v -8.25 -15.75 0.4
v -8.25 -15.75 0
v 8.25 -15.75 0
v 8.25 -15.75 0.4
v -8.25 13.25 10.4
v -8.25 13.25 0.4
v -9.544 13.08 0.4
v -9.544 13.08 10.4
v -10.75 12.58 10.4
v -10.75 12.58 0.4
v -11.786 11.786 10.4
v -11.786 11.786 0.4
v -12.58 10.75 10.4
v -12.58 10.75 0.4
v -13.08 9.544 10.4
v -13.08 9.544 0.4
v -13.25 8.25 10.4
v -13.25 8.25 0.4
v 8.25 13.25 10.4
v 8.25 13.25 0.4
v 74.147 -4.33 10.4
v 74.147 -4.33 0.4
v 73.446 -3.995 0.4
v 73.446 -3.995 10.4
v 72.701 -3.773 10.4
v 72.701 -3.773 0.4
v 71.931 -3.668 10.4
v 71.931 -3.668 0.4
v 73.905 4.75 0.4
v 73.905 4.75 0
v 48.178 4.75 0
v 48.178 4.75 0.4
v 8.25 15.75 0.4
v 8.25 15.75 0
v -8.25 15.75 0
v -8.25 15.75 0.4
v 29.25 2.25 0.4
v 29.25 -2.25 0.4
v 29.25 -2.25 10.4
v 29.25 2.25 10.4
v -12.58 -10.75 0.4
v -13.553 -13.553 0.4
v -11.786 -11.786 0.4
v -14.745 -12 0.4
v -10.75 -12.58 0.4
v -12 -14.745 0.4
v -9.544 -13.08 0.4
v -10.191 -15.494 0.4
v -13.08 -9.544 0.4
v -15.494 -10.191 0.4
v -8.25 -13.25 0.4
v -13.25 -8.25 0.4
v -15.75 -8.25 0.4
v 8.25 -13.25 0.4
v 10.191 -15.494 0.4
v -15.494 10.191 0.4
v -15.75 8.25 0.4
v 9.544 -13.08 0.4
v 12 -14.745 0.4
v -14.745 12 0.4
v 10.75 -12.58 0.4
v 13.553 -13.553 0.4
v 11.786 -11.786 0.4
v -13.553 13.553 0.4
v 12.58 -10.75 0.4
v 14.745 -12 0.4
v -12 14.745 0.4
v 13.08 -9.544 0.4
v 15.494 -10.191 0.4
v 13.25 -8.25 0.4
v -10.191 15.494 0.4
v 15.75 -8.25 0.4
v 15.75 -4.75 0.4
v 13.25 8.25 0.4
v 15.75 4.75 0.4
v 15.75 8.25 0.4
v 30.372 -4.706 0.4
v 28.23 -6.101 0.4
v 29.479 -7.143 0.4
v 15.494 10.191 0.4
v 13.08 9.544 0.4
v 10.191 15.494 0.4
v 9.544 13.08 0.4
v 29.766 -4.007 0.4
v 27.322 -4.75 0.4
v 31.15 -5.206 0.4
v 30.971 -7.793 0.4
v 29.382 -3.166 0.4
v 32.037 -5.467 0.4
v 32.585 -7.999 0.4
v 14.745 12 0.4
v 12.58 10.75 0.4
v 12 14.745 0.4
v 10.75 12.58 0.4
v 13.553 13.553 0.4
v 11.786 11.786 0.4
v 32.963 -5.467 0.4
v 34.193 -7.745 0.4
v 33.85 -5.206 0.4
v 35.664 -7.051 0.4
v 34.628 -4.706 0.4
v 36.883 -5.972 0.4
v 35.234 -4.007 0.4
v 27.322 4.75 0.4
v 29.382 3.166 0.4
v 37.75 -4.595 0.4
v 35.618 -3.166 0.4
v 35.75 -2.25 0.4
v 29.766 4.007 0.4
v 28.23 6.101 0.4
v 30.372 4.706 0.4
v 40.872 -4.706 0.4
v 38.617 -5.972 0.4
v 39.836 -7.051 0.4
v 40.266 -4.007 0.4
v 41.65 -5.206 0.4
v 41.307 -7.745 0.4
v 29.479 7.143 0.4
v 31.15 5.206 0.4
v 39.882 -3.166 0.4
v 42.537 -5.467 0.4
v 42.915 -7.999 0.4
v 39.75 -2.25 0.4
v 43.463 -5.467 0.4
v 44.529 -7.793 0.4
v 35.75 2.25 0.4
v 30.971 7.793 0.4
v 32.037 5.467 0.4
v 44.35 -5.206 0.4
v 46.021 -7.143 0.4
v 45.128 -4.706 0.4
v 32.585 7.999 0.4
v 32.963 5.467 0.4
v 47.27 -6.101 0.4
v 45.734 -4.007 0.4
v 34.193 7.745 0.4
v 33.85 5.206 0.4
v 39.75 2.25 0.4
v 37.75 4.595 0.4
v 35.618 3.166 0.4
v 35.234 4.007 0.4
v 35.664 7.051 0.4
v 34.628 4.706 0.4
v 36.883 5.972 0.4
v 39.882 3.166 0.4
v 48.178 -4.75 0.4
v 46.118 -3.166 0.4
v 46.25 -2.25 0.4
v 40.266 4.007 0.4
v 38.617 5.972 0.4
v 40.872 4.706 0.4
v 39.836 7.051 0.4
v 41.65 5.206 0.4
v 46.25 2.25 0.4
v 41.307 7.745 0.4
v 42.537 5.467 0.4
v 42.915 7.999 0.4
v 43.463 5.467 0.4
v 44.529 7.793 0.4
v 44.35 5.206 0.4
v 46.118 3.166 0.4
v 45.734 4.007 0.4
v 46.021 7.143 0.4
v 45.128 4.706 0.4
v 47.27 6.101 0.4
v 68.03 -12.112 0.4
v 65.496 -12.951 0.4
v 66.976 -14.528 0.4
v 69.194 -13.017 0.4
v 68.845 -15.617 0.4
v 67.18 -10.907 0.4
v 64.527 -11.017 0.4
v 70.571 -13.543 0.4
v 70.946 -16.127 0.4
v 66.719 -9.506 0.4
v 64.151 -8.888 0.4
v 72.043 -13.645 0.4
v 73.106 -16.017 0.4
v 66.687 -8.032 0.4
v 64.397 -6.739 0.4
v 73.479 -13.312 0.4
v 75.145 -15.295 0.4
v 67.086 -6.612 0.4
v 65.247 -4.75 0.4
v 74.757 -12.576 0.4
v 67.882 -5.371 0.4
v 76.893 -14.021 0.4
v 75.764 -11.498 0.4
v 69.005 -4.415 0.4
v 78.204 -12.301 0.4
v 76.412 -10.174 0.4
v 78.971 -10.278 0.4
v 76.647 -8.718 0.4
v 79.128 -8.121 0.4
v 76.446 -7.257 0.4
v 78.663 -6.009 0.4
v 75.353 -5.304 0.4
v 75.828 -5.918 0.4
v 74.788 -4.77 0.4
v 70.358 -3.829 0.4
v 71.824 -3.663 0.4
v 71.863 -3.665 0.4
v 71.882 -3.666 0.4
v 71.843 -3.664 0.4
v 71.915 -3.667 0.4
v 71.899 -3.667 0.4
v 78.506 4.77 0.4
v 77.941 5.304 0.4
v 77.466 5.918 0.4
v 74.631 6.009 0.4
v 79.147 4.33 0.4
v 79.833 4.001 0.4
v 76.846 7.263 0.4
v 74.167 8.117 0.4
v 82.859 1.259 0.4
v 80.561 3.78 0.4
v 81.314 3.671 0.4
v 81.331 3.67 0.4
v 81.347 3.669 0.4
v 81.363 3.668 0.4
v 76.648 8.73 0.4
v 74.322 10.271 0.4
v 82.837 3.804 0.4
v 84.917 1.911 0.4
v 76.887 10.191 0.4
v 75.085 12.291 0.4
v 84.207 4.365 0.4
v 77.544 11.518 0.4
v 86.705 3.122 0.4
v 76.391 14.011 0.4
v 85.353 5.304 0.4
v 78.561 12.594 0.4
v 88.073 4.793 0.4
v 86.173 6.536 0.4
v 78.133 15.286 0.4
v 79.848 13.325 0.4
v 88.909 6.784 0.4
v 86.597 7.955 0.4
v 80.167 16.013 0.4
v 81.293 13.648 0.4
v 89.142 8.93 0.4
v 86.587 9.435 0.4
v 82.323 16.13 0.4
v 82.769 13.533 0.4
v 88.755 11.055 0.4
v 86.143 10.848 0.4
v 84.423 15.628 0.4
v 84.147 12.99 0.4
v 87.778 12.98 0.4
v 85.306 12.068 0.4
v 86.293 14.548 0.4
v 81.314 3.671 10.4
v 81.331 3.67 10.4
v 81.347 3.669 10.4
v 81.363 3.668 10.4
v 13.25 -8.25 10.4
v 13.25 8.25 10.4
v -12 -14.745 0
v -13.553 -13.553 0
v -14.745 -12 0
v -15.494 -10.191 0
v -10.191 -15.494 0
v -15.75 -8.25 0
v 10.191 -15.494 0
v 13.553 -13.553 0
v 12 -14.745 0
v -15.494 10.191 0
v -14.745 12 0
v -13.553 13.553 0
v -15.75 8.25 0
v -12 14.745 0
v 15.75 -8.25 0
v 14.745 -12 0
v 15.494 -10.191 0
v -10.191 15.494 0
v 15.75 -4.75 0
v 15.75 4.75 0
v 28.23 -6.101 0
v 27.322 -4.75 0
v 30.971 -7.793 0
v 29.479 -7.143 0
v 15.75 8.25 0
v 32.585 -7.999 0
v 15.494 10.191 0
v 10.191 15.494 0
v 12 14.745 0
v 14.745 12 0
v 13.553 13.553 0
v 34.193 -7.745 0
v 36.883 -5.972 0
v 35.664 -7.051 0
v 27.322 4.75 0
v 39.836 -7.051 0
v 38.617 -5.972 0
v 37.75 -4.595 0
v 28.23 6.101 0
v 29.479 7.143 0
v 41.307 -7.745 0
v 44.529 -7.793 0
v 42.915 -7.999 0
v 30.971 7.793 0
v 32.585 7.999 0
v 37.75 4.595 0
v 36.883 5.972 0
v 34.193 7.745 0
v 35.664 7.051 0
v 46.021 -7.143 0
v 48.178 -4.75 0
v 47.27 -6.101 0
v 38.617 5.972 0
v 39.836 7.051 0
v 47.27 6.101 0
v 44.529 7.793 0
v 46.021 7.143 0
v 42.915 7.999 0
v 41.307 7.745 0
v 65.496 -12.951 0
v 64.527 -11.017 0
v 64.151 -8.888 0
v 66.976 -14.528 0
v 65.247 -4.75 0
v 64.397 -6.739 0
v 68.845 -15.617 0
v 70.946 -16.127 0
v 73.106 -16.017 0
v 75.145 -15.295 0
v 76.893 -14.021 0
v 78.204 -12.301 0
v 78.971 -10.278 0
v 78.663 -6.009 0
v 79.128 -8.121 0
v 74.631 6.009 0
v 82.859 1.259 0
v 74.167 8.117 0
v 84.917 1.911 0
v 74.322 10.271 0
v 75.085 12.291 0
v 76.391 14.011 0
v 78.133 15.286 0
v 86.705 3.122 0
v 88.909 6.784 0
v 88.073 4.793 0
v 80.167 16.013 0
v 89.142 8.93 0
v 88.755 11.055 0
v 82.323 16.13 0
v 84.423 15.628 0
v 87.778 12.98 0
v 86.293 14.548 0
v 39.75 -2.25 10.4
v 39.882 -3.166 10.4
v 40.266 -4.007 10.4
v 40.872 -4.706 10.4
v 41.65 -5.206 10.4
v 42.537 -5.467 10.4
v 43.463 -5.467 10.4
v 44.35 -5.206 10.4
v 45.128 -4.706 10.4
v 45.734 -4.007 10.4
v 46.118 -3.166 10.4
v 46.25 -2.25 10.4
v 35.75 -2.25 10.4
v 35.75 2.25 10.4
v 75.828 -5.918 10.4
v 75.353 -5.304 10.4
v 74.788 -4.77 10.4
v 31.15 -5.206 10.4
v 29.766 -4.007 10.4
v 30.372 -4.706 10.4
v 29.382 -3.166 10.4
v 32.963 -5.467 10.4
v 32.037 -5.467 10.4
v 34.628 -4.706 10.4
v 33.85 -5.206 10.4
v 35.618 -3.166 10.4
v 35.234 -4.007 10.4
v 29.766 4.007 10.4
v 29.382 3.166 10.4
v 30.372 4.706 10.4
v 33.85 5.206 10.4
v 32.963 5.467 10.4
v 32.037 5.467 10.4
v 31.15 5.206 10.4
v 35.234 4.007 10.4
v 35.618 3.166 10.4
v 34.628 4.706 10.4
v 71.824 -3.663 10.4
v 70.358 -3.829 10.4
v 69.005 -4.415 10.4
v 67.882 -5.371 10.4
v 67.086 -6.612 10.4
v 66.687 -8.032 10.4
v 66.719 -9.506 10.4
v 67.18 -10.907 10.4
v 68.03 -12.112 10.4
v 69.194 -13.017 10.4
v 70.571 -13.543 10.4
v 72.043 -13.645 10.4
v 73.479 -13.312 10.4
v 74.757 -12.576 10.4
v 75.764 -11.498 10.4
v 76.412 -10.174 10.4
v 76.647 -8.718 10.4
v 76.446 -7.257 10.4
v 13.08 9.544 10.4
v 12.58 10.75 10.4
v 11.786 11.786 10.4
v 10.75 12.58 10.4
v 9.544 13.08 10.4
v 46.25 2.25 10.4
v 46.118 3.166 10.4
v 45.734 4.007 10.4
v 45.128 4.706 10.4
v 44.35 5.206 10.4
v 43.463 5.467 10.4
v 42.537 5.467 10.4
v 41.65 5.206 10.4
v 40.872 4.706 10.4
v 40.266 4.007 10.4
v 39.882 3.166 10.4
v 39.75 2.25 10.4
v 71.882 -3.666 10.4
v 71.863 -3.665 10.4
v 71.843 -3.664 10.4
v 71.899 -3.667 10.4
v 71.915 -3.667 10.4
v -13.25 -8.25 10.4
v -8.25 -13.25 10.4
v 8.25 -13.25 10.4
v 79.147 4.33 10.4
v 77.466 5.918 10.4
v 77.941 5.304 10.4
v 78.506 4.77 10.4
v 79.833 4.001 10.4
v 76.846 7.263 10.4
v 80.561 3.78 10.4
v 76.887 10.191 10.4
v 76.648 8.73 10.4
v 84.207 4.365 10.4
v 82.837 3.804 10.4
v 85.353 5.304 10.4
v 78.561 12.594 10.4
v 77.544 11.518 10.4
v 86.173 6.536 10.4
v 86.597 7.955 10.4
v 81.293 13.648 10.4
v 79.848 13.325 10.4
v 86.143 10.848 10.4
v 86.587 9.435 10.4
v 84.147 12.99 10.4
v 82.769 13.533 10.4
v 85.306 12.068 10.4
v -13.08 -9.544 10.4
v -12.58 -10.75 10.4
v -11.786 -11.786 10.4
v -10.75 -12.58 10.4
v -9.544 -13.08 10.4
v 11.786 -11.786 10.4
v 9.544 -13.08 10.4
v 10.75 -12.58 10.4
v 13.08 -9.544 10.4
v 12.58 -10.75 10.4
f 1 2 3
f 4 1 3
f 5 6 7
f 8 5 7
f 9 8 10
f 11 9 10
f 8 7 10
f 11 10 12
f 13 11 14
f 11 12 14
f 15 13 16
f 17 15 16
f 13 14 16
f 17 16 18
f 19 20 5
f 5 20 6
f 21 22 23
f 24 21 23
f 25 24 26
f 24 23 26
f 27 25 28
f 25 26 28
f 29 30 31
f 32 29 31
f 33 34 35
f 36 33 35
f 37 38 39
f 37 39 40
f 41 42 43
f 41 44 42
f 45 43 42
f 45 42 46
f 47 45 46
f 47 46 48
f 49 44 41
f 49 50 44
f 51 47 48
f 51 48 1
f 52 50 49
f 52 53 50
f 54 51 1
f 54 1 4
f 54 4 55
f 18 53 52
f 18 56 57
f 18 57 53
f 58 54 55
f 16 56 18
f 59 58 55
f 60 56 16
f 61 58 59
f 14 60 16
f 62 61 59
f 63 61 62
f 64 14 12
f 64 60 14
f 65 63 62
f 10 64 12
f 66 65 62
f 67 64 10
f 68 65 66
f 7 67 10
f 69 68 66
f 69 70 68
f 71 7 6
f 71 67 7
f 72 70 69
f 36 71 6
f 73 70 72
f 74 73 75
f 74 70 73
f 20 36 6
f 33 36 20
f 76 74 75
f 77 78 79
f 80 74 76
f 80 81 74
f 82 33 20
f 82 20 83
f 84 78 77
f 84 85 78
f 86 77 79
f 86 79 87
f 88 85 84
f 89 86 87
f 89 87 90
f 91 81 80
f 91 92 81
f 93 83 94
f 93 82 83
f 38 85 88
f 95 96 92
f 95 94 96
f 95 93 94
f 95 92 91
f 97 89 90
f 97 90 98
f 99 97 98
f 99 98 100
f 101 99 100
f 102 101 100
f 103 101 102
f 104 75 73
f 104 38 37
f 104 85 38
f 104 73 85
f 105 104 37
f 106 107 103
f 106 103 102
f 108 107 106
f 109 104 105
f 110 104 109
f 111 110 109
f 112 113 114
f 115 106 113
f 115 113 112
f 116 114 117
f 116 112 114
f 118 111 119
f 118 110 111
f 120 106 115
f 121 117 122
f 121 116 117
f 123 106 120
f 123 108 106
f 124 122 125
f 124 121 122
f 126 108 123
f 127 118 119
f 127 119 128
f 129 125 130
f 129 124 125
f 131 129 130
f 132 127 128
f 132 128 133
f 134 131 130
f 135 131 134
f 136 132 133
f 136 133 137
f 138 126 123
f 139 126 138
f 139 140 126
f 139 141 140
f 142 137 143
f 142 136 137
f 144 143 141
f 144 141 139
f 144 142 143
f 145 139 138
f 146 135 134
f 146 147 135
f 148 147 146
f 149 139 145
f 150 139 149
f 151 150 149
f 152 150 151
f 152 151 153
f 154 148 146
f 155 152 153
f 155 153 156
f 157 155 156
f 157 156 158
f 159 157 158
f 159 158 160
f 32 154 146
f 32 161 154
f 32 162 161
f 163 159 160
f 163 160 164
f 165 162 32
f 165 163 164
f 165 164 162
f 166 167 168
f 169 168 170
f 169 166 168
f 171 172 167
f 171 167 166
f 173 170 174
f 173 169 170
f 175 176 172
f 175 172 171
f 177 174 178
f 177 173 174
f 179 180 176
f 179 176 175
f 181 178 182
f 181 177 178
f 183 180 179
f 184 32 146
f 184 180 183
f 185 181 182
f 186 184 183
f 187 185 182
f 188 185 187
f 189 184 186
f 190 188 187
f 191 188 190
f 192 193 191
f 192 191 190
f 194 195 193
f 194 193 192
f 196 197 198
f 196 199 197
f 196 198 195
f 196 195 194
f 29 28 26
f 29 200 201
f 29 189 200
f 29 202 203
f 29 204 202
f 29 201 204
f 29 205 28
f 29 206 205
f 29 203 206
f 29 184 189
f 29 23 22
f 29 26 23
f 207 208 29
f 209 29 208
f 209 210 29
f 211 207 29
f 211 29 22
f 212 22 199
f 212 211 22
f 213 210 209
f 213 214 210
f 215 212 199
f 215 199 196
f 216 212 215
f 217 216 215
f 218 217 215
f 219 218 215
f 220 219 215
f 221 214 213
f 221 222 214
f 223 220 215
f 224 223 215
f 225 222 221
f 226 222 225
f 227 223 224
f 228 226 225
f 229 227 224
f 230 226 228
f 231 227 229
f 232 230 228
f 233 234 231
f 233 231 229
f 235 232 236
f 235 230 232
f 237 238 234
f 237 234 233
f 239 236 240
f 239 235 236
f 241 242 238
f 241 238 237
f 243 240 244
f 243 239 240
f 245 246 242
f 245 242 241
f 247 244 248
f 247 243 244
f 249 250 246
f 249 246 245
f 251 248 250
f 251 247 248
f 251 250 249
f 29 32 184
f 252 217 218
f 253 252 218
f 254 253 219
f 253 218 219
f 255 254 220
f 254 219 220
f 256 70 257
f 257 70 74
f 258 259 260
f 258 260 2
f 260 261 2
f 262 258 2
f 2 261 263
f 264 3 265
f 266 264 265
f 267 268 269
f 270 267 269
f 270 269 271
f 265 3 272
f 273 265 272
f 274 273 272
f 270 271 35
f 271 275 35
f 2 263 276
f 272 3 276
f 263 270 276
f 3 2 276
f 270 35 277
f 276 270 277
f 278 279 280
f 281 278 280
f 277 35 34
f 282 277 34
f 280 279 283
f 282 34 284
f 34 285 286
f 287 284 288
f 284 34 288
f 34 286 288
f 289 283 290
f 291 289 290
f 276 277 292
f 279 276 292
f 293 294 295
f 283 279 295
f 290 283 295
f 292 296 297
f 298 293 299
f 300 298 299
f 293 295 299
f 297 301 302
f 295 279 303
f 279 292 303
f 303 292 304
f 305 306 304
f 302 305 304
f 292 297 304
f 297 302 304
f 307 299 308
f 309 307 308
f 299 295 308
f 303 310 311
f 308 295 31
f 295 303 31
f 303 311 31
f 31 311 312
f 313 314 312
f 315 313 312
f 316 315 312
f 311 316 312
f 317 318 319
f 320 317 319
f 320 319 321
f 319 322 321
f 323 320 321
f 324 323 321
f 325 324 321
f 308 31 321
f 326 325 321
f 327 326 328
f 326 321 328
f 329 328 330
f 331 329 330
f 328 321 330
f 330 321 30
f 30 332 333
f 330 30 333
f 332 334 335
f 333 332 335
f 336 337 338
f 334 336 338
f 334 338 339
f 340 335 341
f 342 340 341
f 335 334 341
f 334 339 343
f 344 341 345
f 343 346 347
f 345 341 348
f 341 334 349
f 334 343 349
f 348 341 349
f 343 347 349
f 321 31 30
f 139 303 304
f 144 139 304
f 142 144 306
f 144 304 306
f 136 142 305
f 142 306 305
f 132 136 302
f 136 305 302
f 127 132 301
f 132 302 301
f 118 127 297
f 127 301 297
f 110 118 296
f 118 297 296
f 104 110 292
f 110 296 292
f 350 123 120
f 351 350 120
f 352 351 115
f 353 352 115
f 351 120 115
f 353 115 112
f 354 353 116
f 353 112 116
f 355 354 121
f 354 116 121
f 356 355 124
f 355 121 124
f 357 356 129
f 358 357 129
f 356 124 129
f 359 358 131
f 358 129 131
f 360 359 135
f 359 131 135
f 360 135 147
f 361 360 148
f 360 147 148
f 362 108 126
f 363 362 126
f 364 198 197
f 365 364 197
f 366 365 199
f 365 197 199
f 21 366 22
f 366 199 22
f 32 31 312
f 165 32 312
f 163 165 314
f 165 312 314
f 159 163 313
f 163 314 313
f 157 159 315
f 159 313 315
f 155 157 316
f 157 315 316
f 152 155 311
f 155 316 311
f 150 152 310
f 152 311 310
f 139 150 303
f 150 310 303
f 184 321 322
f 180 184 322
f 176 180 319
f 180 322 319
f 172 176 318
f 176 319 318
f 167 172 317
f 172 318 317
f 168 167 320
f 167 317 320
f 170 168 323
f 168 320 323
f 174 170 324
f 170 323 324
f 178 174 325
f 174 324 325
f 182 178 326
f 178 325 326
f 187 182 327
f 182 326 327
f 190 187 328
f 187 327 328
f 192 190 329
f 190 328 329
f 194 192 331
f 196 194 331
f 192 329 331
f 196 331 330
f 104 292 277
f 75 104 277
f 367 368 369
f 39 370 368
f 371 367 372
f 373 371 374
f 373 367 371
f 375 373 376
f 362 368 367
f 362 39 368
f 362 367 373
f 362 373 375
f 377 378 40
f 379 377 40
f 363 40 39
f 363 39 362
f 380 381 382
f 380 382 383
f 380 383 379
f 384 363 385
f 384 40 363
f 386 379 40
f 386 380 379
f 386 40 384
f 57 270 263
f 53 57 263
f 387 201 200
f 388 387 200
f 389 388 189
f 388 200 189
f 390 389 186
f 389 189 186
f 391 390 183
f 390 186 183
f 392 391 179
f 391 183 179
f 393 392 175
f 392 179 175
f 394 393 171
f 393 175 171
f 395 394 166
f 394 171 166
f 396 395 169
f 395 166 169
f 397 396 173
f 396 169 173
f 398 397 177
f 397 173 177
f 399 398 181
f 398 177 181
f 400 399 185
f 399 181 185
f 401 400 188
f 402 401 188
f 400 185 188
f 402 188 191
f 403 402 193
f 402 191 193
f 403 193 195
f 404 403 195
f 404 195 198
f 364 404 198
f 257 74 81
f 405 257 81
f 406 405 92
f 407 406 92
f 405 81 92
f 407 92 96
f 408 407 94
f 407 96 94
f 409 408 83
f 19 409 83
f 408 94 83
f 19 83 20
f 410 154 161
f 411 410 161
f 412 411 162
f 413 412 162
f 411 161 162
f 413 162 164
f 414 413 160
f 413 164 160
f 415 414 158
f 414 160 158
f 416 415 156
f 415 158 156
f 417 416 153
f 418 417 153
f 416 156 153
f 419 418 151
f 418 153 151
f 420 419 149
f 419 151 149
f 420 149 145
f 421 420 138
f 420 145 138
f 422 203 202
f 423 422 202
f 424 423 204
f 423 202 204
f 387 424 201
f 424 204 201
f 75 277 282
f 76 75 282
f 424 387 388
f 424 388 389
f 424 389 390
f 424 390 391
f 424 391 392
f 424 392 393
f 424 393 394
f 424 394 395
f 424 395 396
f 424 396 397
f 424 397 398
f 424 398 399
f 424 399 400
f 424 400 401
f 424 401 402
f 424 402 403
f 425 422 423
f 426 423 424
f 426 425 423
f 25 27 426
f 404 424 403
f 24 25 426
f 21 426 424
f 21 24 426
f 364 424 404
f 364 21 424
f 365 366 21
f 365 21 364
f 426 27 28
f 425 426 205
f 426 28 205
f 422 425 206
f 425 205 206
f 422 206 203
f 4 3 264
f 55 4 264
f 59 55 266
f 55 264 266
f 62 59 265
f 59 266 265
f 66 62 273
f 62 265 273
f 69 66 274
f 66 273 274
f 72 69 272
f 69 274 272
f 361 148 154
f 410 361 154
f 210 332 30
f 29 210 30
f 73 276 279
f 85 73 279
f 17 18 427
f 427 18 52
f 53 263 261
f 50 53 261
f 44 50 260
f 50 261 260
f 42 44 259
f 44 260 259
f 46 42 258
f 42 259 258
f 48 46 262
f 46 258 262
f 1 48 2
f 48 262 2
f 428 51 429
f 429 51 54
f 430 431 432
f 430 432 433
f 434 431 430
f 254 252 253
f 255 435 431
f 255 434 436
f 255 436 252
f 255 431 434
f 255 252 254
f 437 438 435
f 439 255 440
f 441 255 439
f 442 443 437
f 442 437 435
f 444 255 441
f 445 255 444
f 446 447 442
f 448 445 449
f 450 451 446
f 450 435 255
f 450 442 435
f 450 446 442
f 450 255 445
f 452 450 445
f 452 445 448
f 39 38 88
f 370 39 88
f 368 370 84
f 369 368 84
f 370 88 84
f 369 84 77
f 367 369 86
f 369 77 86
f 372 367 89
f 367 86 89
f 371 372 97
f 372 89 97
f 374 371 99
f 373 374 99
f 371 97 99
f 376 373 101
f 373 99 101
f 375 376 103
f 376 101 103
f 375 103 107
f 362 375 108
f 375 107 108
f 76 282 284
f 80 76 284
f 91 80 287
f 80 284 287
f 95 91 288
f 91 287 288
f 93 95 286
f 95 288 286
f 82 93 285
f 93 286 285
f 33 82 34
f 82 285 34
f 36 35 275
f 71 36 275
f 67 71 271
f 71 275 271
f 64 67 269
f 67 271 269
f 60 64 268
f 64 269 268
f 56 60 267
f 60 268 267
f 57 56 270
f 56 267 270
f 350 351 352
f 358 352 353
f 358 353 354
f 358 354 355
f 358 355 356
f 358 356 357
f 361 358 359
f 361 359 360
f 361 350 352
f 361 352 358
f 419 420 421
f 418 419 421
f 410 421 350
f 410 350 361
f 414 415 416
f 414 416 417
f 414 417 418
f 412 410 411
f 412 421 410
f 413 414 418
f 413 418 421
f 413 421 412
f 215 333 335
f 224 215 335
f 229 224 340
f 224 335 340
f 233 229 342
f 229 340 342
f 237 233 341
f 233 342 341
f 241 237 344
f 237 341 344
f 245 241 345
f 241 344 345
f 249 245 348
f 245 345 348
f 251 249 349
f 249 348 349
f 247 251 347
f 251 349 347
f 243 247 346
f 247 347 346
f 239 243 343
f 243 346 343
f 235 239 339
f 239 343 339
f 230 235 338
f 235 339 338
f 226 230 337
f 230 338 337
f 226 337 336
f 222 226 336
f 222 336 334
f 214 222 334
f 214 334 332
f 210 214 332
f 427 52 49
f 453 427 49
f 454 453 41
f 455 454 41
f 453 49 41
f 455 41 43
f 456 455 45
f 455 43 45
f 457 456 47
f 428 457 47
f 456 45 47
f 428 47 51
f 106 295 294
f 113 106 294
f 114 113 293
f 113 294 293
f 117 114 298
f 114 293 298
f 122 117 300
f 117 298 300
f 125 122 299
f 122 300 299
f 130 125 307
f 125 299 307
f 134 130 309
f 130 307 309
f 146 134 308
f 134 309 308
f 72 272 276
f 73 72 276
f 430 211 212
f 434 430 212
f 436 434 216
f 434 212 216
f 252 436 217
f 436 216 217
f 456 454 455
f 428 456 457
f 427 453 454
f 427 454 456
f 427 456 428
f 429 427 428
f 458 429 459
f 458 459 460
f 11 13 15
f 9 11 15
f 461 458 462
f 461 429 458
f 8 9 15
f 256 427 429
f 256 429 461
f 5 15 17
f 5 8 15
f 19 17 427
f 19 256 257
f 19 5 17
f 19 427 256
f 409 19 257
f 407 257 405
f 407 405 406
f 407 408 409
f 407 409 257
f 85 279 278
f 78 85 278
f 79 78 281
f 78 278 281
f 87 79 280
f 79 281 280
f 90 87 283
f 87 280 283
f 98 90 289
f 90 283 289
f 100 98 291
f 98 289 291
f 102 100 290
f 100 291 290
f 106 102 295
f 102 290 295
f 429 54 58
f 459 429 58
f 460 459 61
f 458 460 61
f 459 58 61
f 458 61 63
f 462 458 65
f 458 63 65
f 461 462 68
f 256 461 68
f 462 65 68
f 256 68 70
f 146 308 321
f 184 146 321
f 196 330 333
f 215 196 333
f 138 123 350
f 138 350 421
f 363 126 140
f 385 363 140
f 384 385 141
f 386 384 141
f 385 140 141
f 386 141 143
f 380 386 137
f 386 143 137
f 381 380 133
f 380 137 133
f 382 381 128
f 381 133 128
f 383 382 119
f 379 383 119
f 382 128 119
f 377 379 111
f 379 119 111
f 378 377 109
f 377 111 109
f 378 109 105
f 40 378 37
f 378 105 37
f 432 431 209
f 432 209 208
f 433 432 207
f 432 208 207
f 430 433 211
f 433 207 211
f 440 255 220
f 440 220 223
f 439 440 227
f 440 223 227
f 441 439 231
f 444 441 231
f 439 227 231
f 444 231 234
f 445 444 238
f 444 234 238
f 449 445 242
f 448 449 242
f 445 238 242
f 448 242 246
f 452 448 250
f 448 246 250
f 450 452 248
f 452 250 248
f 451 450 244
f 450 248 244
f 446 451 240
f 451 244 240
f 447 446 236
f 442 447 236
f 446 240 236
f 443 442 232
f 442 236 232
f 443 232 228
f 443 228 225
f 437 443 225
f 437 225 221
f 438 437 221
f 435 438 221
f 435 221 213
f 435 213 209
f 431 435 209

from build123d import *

# Parameters (mm, degrees)
F0_W     = 6.5
F0_H     = 4.5
F0_W_2   = 4
F1_DEPTH = 0.4
F2_W     = 6.5
F2_H     = 4.5
F3_DEPTH = 10


with BuildPart() as f1:
    # F0 (on Top) → F1 (new body)
    with BuildSketch(Plane.XY):
        with BuildLine():
            ThreePointArc((37.75, -4.5952078799), (42.9146576596, -7.9993666334), (48.1780787943, -4.75))
            Line((48.1780787943, -4.75), (65.2471210858, -4.75))
            ThreePointArc((65.2471210858, -4.75), (70.9464832256, -16.1274567319), (78.6627816766, -6.0087617221))
            Line((78.6627816766, -6.0087617221), (82.8586882934, 1.2587617221))
            ThreePointArc((82.8586882934, 1.2587617221), (85.397114317, 15.1554445662), (74.6314469575, 6.0087617221))
            Line((74.6314469575, 6.0087617221), (73.9047005384, 4.75))
            Line((73.9047005384, 4.75), (48.1780787943, 4.75))
            ThreePointArc((48.1780787943, 4.75), (42.9146576596, 7.9993666334), (37.75, 4.5952078799))
            ThreePointArc((37.75, 4.5952078799), (32.5853423404, 7.9993666334), (27.3219212057, 4.75))
            Line((27.3219212057, 4.75), (15.75, 4.75))
            Line((15.75, 4.75), (15.75, 8.25))
            ThreePointArc((15.75, 8.25), (13.5533008589, 13.5533008589), (8.25, 15.75))
            Line((8.25, 15.75), (-8.25, 15.75))
            ThreePointArc((-8.25, 15.75), (-13.5533008589, 13.5533008589), (-15.75, 8.25))
            Line((-15.75, 8.25), (-15.75, -8.25))
            ThreePointArc((-15.75, -8.25), (-13.5533008589, -13.5533008589), (-8.25, -15.75))
            Line((-8.25, -15.75), (8.25, -15.75))
            ThreePointArc((8.25, -15.75), (13.5533008589, -13.5533008589), (15.75, -8.25))
            Line((15.75, -8.25), (15.75, -4.75))
            Line((15.75, -4.75), (27.3219212057, -4.75))
            ThreePointArc((27.3219212057, -4.75), (32.5853423404, -7.9993666334), (37.75, -4.5952078799))
        make_face()
        with BuildLine():
            ThreePointArc((-13.25, 8.25), (-11.7855339059, 11.7855339059), (-8.25, 13.25))
            Line((-8.25, 13.25), (-4.5, 13.25))
            Line((-4.5, 13.25), (4.5, 13.25))
            Line((4.5, 13.25), (8.25, 13.25))
            ThreePointArc((8.25, 13.25), (11.7855339059, 11.7855339059), (13.25, 8.25))
            Line((13.25, 8.25), (13.25, 4.5))
            Line((13.25, 4.5), (13.25, 2.25))
            Line((13.25, 2.25), (29.25, 2.25))
            ThreePointArc((29.25, 2.25), (32.5, 5.5), (35.75, 2.25))
            Line((35.75, 2.25), (39.75, 2.25))
            ThreePointArc((39.75, 2.25), (43, 5.5), (46.25, 2.25))
            Line((46.25, 2.25), (75.3480762114, 2.25))
            Line((75.3480762114, 2.25), (77.4659857711, 5.9183269633))
            ThreePointArc((77.4659857711, 5.9183269633), (84.147114317, 12.9903810568), (81.3631000881, 3.6683269633))
            Line((81.3631000881, 3.6683269633), (75.828242863, -5.9183269633))
            ThreePointArc((75.828242863, -5.9183269633), (69.1938526202, -13.0170311778), (71.8236394943, -3.6633711233))
            ThreePointArc((71.8236394943, -3.6633711233), (71.8529421017, -3.6644923419), (71.8822376294, -3.6657853946))
            ThreePointArc((71.8822376294, -3.6657853946), (71.9066861984, -3.6669963399), (71.931128546, -3.6683269633))
            Line((71.931128546, -3.6683269633), (72.75, -2.25))
            Line((72.75, -2.25), (46.25, -2.25))
            ThreePointArc((46.25, -2.25), (43, -5.5), (39.75, -2.25))
            Line((39.75, -2.25), (35.75, -2.25))
            ThreePointArc((35.75, -2.25), (32.5, -5.5), (29.25, -2.25))
            Line((29.25, -2.25), (13.25, -2.25))
            Line((13.25, -2.25), (13.25, -4.5))
            Line((13.25, -4.5), (13.25, -8.25))
            ThreePointArc((13.25, -8.25), (11.7855339059, -11.7855339059), (8.25, -13.25))
            Line((8.25, -13.25), (4.5, -13.25))
            Line((4.5, -13.25), (-4.5, -13.25))
            Line((-4.5, -13.25), (-8.25, -13.25))
            ThreePointArc((-8.25, -13.25), (-11.7855339059, -11.7855339059), (-13.25, -8.25))
            Line((-13.25, -8.25), (-13.25, -4.5))
            Line((-13.25, -4.5), (-13.25, 4.5))
            Line((-13.25, 4.5), (-13.25, 8.25))
        make_face(mode=Mode.SUBTRACT)
        Polygon((75.3480762114, 2.25), (46.25, 2.25), (46.25, -2.25), (72.75, -2.25), align=None)
        Polygon((-4.5, 0), (-4.5, 4.5), (-13.25, 4.5), (-13.25, -4.5), (-4.5, -4.5), align=None)
        Polygon((13.25, 4.5), (4.5, 4.5), (4.5, 0), (4.5, -4.5), (13.25, -4.5), (13.25, -2.25), (13.25, -2.0446819253), (13.25, 2.25), align=None)
        Polygon((4.5, -4.5), (0, -4.5), (-4.5, -4.5), (-4.5, -13.25), (4.5, -13.25), align=None)
        Polygon((4.5, 13.25), (-4.5, 13.25), (-4.5, 4.5), (0, 4.5), (4.5, 4.5), align=None)
        with BuildLine():
            ThreePointArc((75.828242863, -5.9183269633), (74.147114317, -4.3301270189), (71.931128546, -3.6683269633))
            ThreePointArc((71.931128546, -3.6683269633), (71.9066861984, -3.6669963399), (71.8822376294, -3.6657853946))
            ThreePointArc((71.8822376294, -3.6657853946), (71.8529421017, -3.6644923419), (71.8236394943, -3.6633711233))
            ThreePointArc((71.8236394943, -3.6633711233), (69.1938526202, -13.0170311778), (75.828242863, -5.9183269633))
        make_face()
        with BuildLine():
            ThreePointArc((81.3631000881, 3.6683269633), (84.147114317, 12.9903810568), (77.4659857711, 5.9183269633))
            ThreePointArc((77.4659857711, 5.9183269633), (79.1259688283, 4.3424044081), (81.3142907631, 3.6713434872))
            ThreePointArc((81.3142907631, 3.6713434872), (81.3386917377, 3.6697755525), (81.3631000881, 3.6683269633))
        make_face()
        Polygon((29.25, 2.25), (13.25, 2.25), (13.25, -2.0446819253), (13.25, -2.25), (29.25, -2.25), align=None)
        with BuildLine():
            Line((13.25, -4.5), (4.5, -4.5))
            Line((4.5, -4.5), (4.5, -13.25))
            Line((4.5, -13.25), (8.25, -13.25))
            ThreePointArc((8.25, -13.25), (11.7855339059, -11.7855339059), (13.25, -8.25))
            Line((13.25, -8.25), (13.25, -4.5))
        make_face()
        with BuildLine():
            Line((-4.5, 13.25), (-8.25, 13.25))
            ThreePointArc((-8.25, 13.25), (-11.7855339059, 11.7855339059), (-13.25, 8.25))
            Line((-13.25, 8.25), (-13.25, 4.5))
            Line((-13.25, 4.5), (-4.5, 4.5))
            Line((-4.5, 4.5), (-4.5, 13.25))
        make_face()
        with BuildLine():
            Line((8.25, 13.25), (4.5, 13.25))
            Line((4.5, 13.25), (4.5, 4.5))
            Line((4.5, 4.5), (13.25, 4.5))
            Line((13.25, 4.5), (13.25, 8.25))
            ThreePointArc((13.25, 8.25), (11.7855339059, 11.7855339059), (8.25, 13.25))
        make_face()
        with BuildLine():
            Line((-4.5, -4.5), (-13.25, -4.5))
            Line((-13.25, -4.5), (-13.25, -8.25))
            ThreePointArc((-13.25, -8.25), (-11.7855339059, -11.7855339059), (-8.25, -13.25))
            Line((-8.25, -13.25), (-4.5, -13.25))
            Line((-4.5, -13.25), (-4.5, -4.5))
        make_face()
        with BuildLine():
            ThreePointArc((0, 4.5), (-3.1819805153, 3.1819805153), (-4.5, 0))
            ThreePointArc((-4.5, 0), (-3.1819805153, -3.1819805153), (0, -4.5))
            ThreePointArc((0, -4.5), (3.1819805153, -3.1819805153), (4.5, 0))
            ThreePointArc((4.5, 0), (3.1819805153, 3.1819805153), (0, 4.5))
        make_face()
        with BuildLine():
            Line((77.4659857711, 5.9183269633), (75.3480762114, 2.25))
            Line((75.3480762114, 2.25), (72.75, -2.25))
            Line((72.75, -2.25), (71.931128546, -3.6683269633))
            ThreePointArc((71.931128546, -3.6683269633), (74.147114317, -4.3301270189), (75.828242863, -5.9183269633))
            Line((75.828242863, -5.9183269633), (81.3631000881, 3.6683269633))
            ThreePointArc((81.3631000881, 3.6683269633), (81.3386917377, 3.6697755525), (81.3142907631, 3.6713434872))
            ThreePointArc((81.3142907631, 3.6713434872), (79.1259688283, 4.3424044081), (77.4659857711, 5.9183269633))
        make_face()
        with Locations((32.5, 0)):
            Rectangle(F0_W, F0_H)
        with Locations((43, 0)):
            Rectangle(F0_W, F0_H)
        with Locations((37.75, 0)):
            Rectangle(F0_W_2, F0_H)
        with BuildLine():
            Line((46.25, -2.25), (39.75, -2.25))
            ThreePointArc((39.75, -2.25), (43, -5.5), (46.25, -2.25))
        make_face()
        with BuildLine():
            ThreePointArc((46.25, 2.25), (43, 5.5), (39.75, 2.25))
            Line((39.75, 2.25), (46.25, 2.25))
        make_face()
        with BuildLine():
            Line((35.75, -2.25), (29.25, -2.25))
            ThreePointArc((29.25, -2.25), (32.5, -5.5), (35.75, -2.25))
        make_face()
        with BuildLine():
            ThreePointArc((35.75, 2.25), (32.5, 5.5), (29.25, 2.25))
            Line((29.25, 2.25), (35.75, 2.25))
        make_face()
        with BuildLine():
            Line((4.5, 0), (4.5, 4.5))
            Line((4.5, 4.5), (0, 4.5))
            ThreePointArc((0, 4.5), (3.1819805153, 3.1819805153), (4.5, 0))
        make_face()
        with BuildLine():
            Line((0, 4.5), (-4.5, 4.5))
            Line((-4.5, 4.5), (-4.5, 0))
            ThreePointArc((-4.5, 0), (-3.1819805153, 3.1819805153), (0, 4.5))
        make_face()
        with BuildLine():
            ThreePointArc((0, -4.5), (-3.1819805153, -3.1819805153), (-4.5, 0))
            Line((-4.5, 0), (-4.5, -4.5))
            Line((-4.5, -4.5), (0, -4.5))
        make_face()
        with BuildLine():
            Line((4.5, -4.5), (4.5, 0))
            ThreePointArc((4.5, 0), (3.1819805153, -3.1819805153), (0, -4.5))
            Line((0, -4.5), (4.5, -4.5))
        make_face()
    extrude(amount=F1_DEPTH)

    # F2 (on face) → F3 (join)
    with BuildSketch(Plane.XY.offset(0.4)):
        with BuildLine():
            Line((-4.5, 13.25), (-8.25, 13.25))
            ThreePointArc((-8.25, 13.25), (-11.7855339059, 11.7855339059), (-13.25, 8.25))
            Line((-13.25, 8.25), (-13.25, 4.5))
            Line((-13.25, 4.5), (-4.5, 4.5))
            Line((-4.5, 4.5), (-4.5, 13.25))
        make_face()
        Polygon((4.5, 13.25), (-4.5, 13.25), (-4.5, 4.5), (0, 4.5), (4.5, 4.5), align=None)
        with BuildLine():
            Line((8.25, 13.25), (4.5, 13.25))
            Line((4.5, 13.25), (4.5, 4.5))
            Line((4.5, 4.5), (13.25, 4.5))
            Line((13.25, 4.5), (13.25, 8.25))
            ThreePointArc((13.25, 8.25), (11.7855339059, 11.7855339059), (8.25, 13.25))
        make_face()
        Polygon((13.25, 4.5), (4.5, 4.5), (4.5, 0), (4.5, -4.5), (13.25, -4.5), (13.25, -2.25), (13.25, -2.0446819253), (13.25, 2.25), align=None)
        with BuildLine():
            Line((13.25, -4.5), (4.5, -4.5))
            Line((4.5, -4.5), (4.5, -13.25))
            Line((4.5, -13.25), (8.25, -13.25))
            ThreePointArc((8.25, -13.25), (11.7855339059, -11.7855339059), (13.25, -8.25))
            Line((13.25, -8.25), (13.25, -4.5))
        make_face()
        Polygon((4.5, -4.5), (0, -4.5), (-4.5, -4.5), (-4.5, -13.25), (4.5, -13.25), align=None)
        with BuildLine():
            Line((-4.5, -4.5), (-13.25, -4.5))
            Line((-13.25, -4.5), (-13.25, -8.25))
            ThreePointArc((-13.25, -8.25), (-11.7855339059, -11.7855339059), (-8.25, -13.25))
            Line((-8.25, -13.25), (-4.5, -13.25))
            Line((-4.5, -13.25), (-4.5, -4.5))
        make_face()
        Polygon((-4.5, 0), (-4.5, 4.5), (-13.25, 4.5), (-13.25, -4.5), (-4.5, -4.5), align=None)
        with BuildLine():
            ThreePointArc((0, 4.5), (-3.1819805153, 3.1819805153), (-4.5, 0))
            ThreePointArc((-4.5, 0), (-3.1819805153, -3.1819805153), (0, -4.5))
            ThreePointArc((0, -4.5), (3.1819805153, -3.1819805153), (4.5, 0))
            ThreePointArc((4.5, 0), (3.1819805153, 3.1819805153), (0, 4.5))
        make_face()
        with BuildLine():
            Line((4.5, -4.5), (4.5, 0))
            ThreePointArc((4.5, 0), (3.1819805153, -3.1819805153), (0, -4.5))
            Line((0, -4.5), (4.5, -4.5))
        make_face()
        with BuildLine():
            Line((4.5, 0), (4.5, 4.5))
            Line((4.5, 4.5), (0, 4.5))
            ThreePointArc((0, 4.5), (3.1819805153, 3.1819805153), (4.5, 0))
        make_face()
        with BuildLine():
            Line((0, 4.5), (-4.5, 4.5))
            Line((-4.5, 4.5), (-4.5, 0))
            ThreePointArc((-4.5, 0), (-3.1819805153, 3.1819805153), (0, 4.5))
        make_face()
        with BuildLine():
            ThreePointArc((0, -4.5), (-3.1819805153, -3.1819805153), (-4.5, 0))
            Line((-4.5, 0), (-4.5, -4.5))
            Line((-4.5, -4.5), (0, -4.5))
        make_face()
        with BuildLine():
            ThreePointArc((35.75, 2.25), (32.5, 5.5), (29.25, 2.25))
            Line((29.25, 2.25), (35.75, 2.25))
        make_face()
        with Locations((32.5, 0)):
            Rectangle(F2_W, F2_H)
        with BuildLine():
            Line((35.75, -2.25), (29.25, -2.25))
            ThreePointArc((29.25, -2.25), (32.5, -5.5), (35.75, -2.25))
        make_face()
        with BuildLine():
            Line((46.25, -2.25), (39.75, -2.25))
            ThreePointArc((39.75, -2.25), (43, -5.5), (46.25, -2.25))
        make_face()
        with Locations((43, 0)):
            Rectangle(F2_W, F2_H)
        with BuildLine():
            ThreePointArc((46.25, 2.25), (43, 5.5), (39.75, 2.25))
            Line((39.75, 2.25), (46.25, 2.25))
        make_face()
        with BuildLine():
            ThreePointArc((81.3631000881, 3.6683269633), (84.147114317, 12.9903810568), (77.4659857711, 5.9183269633))
            ThreePointArc((77.4659857711, 5.9183269633), (78.2134625543, 5.0256927751), (79.147114317, 4.3301270189))
            ThreePointArc((79.147114317, 4.3301270189), (80.1929061967, 3.8763979841), (81.3142907631, 3.6713434872))
            ThreePointArc((81.3142907631, 3.6713434872), (81.3386917377, 3.6697755525), (81.3631000881, 3.6683269633))
        make_face()
        with BuildLine():
            ThreePointArc((74.147114317, -4.3301270189), (73.0779108208, -3.8693437522), (71.931128546, -3.6683269633))
            ThreePointArc((71.931128546, -3.6683269633), (71.9066861984, -3.6669963399), (71.8822376294, -3.6657853946))
            ThreePointArc((71.8822376294, -3.6657853946), (71.8529421017, -3.6644923419), (71.8236394943, -3.6633711233))
            ThreePointArc((71.8236394943, -3.6633711233), (69.1938526202, -13.0170311778), (75.828242863, -5.9183269633))
            ThreePointArc((75.828242863, -5.9183269633), (75.0807660798, -5.0256927751), (74.147114317, -4.3301270189))
        make_face()
    extrude(amount=F3_DEPTH)


solid = f1.part
